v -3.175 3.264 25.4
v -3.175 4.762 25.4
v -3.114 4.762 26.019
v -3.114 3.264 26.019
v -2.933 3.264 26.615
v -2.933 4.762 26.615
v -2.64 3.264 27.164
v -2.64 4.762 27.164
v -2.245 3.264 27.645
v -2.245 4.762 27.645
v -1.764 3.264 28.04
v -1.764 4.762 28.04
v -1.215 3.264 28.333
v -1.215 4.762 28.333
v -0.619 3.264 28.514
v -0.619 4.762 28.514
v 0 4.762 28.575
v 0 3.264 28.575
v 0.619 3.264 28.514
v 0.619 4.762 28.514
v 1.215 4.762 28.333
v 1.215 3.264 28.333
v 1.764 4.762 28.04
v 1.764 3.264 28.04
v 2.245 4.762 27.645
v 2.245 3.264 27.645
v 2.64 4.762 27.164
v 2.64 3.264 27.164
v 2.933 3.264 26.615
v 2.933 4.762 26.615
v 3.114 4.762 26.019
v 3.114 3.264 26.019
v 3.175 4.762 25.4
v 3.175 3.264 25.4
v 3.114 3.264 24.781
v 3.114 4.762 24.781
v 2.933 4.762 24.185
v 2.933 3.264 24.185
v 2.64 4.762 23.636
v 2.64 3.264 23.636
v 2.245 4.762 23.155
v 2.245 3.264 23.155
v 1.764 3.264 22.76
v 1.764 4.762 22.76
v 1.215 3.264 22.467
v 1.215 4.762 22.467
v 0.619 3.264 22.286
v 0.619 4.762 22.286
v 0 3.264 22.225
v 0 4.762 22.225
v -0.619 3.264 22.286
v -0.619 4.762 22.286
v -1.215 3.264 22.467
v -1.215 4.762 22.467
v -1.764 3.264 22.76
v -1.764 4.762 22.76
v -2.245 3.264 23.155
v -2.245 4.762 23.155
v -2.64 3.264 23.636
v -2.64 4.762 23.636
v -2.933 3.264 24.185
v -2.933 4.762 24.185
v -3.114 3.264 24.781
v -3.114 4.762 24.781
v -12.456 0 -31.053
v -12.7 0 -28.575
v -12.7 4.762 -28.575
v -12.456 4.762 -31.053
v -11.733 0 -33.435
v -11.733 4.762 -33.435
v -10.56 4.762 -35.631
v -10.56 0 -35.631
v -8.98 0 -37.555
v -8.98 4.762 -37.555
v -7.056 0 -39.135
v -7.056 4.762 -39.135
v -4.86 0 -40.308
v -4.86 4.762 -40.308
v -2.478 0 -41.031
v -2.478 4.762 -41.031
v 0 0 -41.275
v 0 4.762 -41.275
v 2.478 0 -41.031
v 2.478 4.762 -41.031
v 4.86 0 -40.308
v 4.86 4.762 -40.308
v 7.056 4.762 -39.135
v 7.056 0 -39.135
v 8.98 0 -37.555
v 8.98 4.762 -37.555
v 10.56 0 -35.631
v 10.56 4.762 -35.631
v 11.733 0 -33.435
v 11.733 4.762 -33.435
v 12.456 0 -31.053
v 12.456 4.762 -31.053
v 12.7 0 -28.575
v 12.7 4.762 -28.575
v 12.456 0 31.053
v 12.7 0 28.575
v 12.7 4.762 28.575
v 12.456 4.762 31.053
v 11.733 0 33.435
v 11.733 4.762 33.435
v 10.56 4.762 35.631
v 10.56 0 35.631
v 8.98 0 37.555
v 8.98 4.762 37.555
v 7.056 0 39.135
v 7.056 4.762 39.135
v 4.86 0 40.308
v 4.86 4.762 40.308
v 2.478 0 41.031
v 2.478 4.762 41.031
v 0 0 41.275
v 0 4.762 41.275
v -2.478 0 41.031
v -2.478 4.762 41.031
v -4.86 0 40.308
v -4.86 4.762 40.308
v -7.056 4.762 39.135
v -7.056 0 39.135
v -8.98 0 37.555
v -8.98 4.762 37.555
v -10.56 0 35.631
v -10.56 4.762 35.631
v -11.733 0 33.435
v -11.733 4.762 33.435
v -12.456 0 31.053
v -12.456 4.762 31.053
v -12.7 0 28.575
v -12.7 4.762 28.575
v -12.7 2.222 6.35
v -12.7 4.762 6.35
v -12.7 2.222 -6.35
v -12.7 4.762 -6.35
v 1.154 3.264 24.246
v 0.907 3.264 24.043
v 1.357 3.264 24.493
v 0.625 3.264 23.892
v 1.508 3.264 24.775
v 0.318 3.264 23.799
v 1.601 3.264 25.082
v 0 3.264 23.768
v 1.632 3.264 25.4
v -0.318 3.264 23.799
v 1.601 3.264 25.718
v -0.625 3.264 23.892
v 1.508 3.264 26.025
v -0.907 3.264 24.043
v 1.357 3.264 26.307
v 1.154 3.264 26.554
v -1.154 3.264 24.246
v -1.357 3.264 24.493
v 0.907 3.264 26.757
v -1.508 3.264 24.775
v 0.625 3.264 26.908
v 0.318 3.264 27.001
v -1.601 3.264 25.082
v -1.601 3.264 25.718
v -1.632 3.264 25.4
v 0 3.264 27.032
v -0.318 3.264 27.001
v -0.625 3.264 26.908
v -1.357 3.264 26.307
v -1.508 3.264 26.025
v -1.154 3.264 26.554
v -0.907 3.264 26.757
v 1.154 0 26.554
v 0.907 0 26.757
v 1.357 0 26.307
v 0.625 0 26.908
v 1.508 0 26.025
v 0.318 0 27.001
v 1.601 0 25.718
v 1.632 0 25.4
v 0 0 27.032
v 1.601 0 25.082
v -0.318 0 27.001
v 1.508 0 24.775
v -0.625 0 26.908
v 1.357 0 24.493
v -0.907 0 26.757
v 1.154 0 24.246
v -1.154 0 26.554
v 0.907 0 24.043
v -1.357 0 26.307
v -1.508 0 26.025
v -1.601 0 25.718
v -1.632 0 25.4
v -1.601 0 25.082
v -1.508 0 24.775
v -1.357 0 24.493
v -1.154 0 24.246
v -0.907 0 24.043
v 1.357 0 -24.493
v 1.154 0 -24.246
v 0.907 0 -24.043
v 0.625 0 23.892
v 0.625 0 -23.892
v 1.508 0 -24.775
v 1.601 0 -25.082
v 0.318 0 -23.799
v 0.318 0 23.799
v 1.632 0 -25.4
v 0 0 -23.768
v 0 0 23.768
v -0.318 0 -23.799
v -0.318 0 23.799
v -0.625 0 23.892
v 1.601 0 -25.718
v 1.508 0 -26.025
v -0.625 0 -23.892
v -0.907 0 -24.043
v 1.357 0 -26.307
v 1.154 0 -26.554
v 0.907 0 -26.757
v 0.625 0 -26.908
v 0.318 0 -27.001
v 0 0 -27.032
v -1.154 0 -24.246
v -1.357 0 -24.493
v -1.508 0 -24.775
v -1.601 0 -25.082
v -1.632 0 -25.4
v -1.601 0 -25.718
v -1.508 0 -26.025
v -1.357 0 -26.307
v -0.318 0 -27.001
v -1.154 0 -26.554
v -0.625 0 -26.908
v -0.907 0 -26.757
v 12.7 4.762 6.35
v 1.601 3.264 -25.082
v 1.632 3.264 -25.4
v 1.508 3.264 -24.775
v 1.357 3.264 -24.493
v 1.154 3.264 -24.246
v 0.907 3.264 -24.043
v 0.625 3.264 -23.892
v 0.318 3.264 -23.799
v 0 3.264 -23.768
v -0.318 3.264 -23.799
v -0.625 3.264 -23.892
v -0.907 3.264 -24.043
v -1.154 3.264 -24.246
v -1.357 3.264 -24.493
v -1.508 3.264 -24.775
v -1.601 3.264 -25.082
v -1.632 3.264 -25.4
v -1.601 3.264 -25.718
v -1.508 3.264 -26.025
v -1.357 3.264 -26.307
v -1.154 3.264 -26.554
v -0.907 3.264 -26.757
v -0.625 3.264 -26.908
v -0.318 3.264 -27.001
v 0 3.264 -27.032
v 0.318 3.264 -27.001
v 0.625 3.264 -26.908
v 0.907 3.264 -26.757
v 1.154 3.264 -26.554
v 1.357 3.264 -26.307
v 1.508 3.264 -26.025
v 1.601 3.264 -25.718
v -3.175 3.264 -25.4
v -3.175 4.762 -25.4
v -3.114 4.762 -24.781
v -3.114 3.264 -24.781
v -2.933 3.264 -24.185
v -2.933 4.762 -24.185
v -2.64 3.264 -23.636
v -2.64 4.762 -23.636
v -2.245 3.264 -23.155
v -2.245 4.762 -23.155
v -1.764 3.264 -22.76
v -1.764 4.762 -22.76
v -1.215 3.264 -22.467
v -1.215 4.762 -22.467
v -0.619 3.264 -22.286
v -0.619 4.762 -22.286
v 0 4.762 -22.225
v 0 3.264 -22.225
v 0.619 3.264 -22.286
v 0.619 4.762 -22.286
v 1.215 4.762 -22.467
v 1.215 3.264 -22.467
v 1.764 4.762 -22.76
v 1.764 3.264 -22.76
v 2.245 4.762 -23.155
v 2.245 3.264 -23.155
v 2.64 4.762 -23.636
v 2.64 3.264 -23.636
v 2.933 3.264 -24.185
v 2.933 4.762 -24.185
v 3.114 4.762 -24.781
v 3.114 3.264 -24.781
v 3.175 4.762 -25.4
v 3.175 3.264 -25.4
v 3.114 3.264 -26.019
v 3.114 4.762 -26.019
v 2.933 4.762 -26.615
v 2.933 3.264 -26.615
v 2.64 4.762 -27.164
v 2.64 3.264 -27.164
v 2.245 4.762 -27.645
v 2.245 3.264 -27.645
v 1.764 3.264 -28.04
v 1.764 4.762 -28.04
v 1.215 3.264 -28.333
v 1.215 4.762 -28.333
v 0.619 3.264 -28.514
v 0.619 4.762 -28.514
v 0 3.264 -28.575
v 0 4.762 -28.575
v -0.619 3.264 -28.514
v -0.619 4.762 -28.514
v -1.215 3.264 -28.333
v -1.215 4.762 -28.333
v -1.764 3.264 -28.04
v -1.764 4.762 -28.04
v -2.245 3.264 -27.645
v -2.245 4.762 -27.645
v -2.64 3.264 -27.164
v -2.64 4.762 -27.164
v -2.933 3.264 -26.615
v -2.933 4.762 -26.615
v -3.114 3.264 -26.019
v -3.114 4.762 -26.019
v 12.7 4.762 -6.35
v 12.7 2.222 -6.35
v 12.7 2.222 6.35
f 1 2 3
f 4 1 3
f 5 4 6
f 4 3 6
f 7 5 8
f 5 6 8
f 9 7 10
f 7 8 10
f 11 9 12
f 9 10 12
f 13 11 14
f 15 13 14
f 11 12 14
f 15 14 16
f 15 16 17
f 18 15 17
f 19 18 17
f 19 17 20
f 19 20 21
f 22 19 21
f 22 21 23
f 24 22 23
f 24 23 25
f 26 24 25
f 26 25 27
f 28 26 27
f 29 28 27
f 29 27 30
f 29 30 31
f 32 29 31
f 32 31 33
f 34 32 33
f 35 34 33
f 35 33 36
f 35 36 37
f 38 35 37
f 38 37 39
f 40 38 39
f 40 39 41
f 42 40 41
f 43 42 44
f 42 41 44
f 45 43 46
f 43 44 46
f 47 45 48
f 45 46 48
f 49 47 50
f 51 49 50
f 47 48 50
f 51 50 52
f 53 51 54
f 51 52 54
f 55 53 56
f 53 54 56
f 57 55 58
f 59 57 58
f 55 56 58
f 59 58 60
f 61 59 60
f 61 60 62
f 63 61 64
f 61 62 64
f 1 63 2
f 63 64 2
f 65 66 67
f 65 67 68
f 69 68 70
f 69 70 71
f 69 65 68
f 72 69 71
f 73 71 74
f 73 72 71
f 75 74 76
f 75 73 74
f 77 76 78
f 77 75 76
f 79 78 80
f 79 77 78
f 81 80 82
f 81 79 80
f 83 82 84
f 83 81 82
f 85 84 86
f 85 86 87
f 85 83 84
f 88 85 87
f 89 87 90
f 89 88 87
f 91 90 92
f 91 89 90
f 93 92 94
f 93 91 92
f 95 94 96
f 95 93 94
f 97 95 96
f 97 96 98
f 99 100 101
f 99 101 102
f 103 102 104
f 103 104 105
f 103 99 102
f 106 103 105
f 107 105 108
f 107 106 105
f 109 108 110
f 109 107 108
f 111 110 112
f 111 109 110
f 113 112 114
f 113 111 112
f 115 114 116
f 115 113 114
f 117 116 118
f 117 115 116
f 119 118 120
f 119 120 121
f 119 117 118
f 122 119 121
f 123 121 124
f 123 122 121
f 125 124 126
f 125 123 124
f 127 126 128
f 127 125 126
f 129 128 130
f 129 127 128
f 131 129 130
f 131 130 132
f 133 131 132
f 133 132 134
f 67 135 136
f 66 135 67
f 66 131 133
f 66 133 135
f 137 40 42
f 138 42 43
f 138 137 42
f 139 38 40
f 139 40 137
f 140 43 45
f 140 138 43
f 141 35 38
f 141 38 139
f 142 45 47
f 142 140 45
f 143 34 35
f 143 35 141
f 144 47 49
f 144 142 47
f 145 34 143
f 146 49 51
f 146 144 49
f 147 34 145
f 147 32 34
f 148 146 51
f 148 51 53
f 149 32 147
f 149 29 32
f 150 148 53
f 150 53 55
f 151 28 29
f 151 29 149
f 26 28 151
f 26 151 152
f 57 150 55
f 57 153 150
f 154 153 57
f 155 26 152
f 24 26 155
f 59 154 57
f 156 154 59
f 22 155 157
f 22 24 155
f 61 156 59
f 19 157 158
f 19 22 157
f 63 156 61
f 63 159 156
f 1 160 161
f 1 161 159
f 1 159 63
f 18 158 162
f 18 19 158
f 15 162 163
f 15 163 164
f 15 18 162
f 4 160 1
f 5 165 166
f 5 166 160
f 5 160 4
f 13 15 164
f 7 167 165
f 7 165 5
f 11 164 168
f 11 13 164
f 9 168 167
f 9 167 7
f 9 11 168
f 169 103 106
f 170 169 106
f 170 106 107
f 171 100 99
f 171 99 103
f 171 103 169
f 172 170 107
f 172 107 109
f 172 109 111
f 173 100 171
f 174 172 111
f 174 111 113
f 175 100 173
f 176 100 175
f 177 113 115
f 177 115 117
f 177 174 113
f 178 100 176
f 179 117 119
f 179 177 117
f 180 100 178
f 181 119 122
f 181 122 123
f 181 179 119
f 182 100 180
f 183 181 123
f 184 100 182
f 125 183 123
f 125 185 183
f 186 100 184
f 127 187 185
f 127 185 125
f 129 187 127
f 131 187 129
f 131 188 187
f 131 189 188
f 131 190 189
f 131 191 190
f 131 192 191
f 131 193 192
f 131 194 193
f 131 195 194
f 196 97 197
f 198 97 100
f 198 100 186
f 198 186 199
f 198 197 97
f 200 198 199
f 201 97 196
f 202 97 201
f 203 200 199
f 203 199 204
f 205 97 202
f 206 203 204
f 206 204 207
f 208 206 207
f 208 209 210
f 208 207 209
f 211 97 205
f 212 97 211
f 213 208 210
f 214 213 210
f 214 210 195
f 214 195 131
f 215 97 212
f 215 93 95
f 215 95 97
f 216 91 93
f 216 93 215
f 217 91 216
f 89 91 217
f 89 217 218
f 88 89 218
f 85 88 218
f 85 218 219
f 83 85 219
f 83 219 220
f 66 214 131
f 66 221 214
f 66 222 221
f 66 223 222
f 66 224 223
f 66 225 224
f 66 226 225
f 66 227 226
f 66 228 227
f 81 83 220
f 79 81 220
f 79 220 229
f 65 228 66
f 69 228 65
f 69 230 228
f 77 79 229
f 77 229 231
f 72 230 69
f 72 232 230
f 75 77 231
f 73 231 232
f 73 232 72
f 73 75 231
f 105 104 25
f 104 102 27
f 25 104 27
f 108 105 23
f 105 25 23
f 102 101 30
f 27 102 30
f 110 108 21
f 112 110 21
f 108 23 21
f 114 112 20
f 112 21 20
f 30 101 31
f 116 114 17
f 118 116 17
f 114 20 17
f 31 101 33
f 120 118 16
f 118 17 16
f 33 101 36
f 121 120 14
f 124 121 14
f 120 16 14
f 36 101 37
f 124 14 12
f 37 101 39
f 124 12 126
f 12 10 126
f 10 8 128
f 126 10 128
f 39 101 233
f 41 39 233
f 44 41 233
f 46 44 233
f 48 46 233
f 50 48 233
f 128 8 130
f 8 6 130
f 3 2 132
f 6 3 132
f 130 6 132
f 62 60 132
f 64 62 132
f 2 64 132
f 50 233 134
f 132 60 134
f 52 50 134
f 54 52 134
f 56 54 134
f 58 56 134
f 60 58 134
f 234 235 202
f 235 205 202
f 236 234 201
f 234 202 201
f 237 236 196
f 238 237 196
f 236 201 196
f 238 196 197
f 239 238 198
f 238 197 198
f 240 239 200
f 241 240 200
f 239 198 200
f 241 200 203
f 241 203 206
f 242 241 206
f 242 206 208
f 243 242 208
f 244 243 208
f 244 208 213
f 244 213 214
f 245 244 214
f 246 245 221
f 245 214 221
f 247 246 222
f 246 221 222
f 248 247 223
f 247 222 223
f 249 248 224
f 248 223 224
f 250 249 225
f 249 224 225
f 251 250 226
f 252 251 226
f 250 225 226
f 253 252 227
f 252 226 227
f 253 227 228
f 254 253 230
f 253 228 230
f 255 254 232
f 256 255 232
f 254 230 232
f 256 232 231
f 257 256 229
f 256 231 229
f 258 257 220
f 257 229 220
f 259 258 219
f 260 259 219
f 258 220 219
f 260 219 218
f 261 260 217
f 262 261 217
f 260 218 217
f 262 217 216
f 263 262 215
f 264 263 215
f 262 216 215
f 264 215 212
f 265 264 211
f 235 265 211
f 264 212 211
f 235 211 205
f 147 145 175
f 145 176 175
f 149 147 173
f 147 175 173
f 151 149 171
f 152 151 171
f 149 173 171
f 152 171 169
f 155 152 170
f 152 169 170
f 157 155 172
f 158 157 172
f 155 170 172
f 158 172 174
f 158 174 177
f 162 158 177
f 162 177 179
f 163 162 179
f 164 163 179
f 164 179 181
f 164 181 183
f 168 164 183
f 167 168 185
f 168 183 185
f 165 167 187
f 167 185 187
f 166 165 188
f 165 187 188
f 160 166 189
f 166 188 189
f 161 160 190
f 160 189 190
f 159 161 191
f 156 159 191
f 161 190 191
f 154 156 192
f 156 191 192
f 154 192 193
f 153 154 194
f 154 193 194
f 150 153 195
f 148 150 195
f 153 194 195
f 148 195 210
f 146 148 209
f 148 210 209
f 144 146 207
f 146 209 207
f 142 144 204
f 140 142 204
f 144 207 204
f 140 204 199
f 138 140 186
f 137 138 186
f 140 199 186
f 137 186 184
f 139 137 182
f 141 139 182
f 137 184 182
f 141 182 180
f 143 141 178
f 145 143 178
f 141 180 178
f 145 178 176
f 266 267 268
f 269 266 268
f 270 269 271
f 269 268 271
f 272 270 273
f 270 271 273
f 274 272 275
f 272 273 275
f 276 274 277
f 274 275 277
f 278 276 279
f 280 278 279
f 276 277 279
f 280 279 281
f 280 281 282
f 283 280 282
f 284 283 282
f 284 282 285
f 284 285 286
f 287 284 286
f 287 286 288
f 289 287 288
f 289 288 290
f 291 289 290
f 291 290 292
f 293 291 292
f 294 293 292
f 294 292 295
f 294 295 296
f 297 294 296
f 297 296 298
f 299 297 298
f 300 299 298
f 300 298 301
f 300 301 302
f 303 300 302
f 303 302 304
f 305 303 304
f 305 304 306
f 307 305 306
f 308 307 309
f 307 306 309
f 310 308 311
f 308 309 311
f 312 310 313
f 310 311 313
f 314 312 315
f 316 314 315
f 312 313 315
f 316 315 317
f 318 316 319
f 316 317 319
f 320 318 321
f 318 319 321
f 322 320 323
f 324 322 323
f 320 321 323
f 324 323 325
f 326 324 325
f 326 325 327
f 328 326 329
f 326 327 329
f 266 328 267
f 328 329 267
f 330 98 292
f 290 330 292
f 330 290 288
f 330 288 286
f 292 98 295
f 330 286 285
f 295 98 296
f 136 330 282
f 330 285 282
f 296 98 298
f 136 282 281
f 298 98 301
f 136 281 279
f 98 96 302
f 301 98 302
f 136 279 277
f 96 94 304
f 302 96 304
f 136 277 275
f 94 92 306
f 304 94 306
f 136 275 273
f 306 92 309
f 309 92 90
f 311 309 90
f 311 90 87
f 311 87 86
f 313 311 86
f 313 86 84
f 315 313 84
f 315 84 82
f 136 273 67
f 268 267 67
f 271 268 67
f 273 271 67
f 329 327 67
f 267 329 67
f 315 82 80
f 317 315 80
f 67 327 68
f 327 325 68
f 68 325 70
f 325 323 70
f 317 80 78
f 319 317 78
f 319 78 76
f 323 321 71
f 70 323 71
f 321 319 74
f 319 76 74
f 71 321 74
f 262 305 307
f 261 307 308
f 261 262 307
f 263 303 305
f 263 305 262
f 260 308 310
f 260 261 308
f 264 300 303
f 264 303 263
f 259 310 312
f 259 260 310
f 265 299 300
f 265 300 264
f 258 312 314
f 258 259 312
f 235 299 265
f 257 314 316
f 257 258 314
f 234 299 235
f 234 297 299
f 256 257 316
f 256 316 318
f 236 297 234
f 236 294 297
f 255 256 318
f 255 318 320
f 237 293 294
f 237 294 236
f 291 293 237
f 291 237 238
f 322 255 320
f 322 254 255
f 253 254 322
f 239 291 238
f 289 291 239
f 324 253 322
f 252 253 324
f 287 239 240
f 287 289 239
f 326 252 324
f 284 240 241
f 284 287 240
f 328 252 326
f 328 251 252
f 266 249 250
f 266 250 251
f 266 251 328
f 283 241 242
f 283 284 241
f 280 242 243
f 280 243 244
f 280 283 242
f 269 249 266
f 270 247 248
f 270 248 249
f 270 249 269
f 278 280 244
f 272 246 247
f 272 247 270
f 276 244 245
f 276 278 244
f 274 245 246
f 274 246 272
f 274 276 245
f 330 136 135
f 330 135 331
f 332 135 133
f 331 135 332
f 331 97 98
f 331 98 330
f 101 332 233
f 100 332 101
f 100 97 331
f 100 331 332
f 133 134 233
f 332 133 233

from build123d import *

# Parameters (mm, degrees)
BOSS_EXTRUDE1_DEPTH                            = 4.7625
CBORE_FOR_4_BUTTON_HEAD_CAP_SCREW1_D           = 3.2639
CBORE_FOR_4_BUTTON_HEAD_CAP_SCREW1_CBORE_D     = 6.35
CBORE_FOR_4_BUTTON_HEAD_CAP_SCREW1_CBORE_DEPTH = 1.4986
SKETCH6_W                                      = 25.4
SKETCH6_H                                      = 12.7
CUT_EXTRUDE1_DEPTH                             = 2.54


with BuildPart() as part:
    # Sketch1 → Boss-Extrude1 (new body)
    with BuildSketch(Plane(origin=(0, 0, 0), x_dir=(1, 0, 0), z_dir=(0, 1, 0))):
        with BuildLine():
            Line((-12.7, -28.575), (-12.7, 28.575))
            ThreePointArc((-12.7, 28.575), (0, 41.275), (12.7, 28.575))
            Line((12.7, 28.575), (12.7, -28.575))
            ThreePointArc((12.7, -28.575), (0, -41.275), (-12.7, -28.575))
        make_face()
    extrude(amount=BOSS_EXTRUDE1_DEPTH)

    # CBORE for #4 Button Head Cap Screw1 (through all)
    with Locations(Plane(origin=(0, 4.7625, 0), x_dir=(-1, 0, 0), z_dir=(0, 1, 0))):
        with Locations((0, 25.4), (0, -25.4)):
            CounterBoreHole(CBORE_FOR_4_BUTTON_HEAD_CAP_SCREW1_D / 2, CBORE_FOR_4_BUTTON_HEAD_CAP_SCREW1_CBORE_D / 2, CBORE_FOR_4_BUTTON_HEAD_CAP_SCREW1_CBORE_DEPTH)

    # Sketch6 → Cut-Extrude1 (cut)
    with BuildSketch(Plane(origin=(0, 4.7625, 0), x_dir=(1, 0, 0), z_dir=(0, 1, 0))):
        Rectangle(SKETCH6_W, SKETCH6_H)
    extrude(amount=-CUT_EXTRUDE1_DEPTH, mode=Mode.SUBTRACT)


solid = part.part
